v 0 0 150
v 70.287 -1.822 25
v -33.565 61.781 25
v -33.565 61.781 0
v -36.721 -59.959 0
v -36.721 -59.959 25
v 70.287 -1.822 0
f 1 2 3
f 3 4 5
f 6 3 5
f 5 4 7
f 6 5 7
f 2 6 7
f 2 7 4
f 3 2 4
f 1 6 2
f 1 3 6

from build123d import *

# Parameters (mm, degrees)
F1_DEPTH = 25


with BuildPart() as f1:
    # F0 (on Top) → F1 (new body)
    with BuildSketch(Plane.XY):
        Polygon((70.286689, -1.822083), (-33.565374, 61.7811), (-36.721315, -59.959017), align=None)
    extrude(amount=F1_DEPTH)

    # F1_face (on face) → F4 section 0
    with BuildSketch(Plane.XY.offset(25), mode=Mode.PRIVATE) as f4_s0:
        Polygon((-36.721315, -59.959017), (70.286689, -1.822083), (-33.565374, 61.7811), align=None)
    loft([f4_s0.sketch, Vertex(0, 0, 150)])


solid = f1.part
